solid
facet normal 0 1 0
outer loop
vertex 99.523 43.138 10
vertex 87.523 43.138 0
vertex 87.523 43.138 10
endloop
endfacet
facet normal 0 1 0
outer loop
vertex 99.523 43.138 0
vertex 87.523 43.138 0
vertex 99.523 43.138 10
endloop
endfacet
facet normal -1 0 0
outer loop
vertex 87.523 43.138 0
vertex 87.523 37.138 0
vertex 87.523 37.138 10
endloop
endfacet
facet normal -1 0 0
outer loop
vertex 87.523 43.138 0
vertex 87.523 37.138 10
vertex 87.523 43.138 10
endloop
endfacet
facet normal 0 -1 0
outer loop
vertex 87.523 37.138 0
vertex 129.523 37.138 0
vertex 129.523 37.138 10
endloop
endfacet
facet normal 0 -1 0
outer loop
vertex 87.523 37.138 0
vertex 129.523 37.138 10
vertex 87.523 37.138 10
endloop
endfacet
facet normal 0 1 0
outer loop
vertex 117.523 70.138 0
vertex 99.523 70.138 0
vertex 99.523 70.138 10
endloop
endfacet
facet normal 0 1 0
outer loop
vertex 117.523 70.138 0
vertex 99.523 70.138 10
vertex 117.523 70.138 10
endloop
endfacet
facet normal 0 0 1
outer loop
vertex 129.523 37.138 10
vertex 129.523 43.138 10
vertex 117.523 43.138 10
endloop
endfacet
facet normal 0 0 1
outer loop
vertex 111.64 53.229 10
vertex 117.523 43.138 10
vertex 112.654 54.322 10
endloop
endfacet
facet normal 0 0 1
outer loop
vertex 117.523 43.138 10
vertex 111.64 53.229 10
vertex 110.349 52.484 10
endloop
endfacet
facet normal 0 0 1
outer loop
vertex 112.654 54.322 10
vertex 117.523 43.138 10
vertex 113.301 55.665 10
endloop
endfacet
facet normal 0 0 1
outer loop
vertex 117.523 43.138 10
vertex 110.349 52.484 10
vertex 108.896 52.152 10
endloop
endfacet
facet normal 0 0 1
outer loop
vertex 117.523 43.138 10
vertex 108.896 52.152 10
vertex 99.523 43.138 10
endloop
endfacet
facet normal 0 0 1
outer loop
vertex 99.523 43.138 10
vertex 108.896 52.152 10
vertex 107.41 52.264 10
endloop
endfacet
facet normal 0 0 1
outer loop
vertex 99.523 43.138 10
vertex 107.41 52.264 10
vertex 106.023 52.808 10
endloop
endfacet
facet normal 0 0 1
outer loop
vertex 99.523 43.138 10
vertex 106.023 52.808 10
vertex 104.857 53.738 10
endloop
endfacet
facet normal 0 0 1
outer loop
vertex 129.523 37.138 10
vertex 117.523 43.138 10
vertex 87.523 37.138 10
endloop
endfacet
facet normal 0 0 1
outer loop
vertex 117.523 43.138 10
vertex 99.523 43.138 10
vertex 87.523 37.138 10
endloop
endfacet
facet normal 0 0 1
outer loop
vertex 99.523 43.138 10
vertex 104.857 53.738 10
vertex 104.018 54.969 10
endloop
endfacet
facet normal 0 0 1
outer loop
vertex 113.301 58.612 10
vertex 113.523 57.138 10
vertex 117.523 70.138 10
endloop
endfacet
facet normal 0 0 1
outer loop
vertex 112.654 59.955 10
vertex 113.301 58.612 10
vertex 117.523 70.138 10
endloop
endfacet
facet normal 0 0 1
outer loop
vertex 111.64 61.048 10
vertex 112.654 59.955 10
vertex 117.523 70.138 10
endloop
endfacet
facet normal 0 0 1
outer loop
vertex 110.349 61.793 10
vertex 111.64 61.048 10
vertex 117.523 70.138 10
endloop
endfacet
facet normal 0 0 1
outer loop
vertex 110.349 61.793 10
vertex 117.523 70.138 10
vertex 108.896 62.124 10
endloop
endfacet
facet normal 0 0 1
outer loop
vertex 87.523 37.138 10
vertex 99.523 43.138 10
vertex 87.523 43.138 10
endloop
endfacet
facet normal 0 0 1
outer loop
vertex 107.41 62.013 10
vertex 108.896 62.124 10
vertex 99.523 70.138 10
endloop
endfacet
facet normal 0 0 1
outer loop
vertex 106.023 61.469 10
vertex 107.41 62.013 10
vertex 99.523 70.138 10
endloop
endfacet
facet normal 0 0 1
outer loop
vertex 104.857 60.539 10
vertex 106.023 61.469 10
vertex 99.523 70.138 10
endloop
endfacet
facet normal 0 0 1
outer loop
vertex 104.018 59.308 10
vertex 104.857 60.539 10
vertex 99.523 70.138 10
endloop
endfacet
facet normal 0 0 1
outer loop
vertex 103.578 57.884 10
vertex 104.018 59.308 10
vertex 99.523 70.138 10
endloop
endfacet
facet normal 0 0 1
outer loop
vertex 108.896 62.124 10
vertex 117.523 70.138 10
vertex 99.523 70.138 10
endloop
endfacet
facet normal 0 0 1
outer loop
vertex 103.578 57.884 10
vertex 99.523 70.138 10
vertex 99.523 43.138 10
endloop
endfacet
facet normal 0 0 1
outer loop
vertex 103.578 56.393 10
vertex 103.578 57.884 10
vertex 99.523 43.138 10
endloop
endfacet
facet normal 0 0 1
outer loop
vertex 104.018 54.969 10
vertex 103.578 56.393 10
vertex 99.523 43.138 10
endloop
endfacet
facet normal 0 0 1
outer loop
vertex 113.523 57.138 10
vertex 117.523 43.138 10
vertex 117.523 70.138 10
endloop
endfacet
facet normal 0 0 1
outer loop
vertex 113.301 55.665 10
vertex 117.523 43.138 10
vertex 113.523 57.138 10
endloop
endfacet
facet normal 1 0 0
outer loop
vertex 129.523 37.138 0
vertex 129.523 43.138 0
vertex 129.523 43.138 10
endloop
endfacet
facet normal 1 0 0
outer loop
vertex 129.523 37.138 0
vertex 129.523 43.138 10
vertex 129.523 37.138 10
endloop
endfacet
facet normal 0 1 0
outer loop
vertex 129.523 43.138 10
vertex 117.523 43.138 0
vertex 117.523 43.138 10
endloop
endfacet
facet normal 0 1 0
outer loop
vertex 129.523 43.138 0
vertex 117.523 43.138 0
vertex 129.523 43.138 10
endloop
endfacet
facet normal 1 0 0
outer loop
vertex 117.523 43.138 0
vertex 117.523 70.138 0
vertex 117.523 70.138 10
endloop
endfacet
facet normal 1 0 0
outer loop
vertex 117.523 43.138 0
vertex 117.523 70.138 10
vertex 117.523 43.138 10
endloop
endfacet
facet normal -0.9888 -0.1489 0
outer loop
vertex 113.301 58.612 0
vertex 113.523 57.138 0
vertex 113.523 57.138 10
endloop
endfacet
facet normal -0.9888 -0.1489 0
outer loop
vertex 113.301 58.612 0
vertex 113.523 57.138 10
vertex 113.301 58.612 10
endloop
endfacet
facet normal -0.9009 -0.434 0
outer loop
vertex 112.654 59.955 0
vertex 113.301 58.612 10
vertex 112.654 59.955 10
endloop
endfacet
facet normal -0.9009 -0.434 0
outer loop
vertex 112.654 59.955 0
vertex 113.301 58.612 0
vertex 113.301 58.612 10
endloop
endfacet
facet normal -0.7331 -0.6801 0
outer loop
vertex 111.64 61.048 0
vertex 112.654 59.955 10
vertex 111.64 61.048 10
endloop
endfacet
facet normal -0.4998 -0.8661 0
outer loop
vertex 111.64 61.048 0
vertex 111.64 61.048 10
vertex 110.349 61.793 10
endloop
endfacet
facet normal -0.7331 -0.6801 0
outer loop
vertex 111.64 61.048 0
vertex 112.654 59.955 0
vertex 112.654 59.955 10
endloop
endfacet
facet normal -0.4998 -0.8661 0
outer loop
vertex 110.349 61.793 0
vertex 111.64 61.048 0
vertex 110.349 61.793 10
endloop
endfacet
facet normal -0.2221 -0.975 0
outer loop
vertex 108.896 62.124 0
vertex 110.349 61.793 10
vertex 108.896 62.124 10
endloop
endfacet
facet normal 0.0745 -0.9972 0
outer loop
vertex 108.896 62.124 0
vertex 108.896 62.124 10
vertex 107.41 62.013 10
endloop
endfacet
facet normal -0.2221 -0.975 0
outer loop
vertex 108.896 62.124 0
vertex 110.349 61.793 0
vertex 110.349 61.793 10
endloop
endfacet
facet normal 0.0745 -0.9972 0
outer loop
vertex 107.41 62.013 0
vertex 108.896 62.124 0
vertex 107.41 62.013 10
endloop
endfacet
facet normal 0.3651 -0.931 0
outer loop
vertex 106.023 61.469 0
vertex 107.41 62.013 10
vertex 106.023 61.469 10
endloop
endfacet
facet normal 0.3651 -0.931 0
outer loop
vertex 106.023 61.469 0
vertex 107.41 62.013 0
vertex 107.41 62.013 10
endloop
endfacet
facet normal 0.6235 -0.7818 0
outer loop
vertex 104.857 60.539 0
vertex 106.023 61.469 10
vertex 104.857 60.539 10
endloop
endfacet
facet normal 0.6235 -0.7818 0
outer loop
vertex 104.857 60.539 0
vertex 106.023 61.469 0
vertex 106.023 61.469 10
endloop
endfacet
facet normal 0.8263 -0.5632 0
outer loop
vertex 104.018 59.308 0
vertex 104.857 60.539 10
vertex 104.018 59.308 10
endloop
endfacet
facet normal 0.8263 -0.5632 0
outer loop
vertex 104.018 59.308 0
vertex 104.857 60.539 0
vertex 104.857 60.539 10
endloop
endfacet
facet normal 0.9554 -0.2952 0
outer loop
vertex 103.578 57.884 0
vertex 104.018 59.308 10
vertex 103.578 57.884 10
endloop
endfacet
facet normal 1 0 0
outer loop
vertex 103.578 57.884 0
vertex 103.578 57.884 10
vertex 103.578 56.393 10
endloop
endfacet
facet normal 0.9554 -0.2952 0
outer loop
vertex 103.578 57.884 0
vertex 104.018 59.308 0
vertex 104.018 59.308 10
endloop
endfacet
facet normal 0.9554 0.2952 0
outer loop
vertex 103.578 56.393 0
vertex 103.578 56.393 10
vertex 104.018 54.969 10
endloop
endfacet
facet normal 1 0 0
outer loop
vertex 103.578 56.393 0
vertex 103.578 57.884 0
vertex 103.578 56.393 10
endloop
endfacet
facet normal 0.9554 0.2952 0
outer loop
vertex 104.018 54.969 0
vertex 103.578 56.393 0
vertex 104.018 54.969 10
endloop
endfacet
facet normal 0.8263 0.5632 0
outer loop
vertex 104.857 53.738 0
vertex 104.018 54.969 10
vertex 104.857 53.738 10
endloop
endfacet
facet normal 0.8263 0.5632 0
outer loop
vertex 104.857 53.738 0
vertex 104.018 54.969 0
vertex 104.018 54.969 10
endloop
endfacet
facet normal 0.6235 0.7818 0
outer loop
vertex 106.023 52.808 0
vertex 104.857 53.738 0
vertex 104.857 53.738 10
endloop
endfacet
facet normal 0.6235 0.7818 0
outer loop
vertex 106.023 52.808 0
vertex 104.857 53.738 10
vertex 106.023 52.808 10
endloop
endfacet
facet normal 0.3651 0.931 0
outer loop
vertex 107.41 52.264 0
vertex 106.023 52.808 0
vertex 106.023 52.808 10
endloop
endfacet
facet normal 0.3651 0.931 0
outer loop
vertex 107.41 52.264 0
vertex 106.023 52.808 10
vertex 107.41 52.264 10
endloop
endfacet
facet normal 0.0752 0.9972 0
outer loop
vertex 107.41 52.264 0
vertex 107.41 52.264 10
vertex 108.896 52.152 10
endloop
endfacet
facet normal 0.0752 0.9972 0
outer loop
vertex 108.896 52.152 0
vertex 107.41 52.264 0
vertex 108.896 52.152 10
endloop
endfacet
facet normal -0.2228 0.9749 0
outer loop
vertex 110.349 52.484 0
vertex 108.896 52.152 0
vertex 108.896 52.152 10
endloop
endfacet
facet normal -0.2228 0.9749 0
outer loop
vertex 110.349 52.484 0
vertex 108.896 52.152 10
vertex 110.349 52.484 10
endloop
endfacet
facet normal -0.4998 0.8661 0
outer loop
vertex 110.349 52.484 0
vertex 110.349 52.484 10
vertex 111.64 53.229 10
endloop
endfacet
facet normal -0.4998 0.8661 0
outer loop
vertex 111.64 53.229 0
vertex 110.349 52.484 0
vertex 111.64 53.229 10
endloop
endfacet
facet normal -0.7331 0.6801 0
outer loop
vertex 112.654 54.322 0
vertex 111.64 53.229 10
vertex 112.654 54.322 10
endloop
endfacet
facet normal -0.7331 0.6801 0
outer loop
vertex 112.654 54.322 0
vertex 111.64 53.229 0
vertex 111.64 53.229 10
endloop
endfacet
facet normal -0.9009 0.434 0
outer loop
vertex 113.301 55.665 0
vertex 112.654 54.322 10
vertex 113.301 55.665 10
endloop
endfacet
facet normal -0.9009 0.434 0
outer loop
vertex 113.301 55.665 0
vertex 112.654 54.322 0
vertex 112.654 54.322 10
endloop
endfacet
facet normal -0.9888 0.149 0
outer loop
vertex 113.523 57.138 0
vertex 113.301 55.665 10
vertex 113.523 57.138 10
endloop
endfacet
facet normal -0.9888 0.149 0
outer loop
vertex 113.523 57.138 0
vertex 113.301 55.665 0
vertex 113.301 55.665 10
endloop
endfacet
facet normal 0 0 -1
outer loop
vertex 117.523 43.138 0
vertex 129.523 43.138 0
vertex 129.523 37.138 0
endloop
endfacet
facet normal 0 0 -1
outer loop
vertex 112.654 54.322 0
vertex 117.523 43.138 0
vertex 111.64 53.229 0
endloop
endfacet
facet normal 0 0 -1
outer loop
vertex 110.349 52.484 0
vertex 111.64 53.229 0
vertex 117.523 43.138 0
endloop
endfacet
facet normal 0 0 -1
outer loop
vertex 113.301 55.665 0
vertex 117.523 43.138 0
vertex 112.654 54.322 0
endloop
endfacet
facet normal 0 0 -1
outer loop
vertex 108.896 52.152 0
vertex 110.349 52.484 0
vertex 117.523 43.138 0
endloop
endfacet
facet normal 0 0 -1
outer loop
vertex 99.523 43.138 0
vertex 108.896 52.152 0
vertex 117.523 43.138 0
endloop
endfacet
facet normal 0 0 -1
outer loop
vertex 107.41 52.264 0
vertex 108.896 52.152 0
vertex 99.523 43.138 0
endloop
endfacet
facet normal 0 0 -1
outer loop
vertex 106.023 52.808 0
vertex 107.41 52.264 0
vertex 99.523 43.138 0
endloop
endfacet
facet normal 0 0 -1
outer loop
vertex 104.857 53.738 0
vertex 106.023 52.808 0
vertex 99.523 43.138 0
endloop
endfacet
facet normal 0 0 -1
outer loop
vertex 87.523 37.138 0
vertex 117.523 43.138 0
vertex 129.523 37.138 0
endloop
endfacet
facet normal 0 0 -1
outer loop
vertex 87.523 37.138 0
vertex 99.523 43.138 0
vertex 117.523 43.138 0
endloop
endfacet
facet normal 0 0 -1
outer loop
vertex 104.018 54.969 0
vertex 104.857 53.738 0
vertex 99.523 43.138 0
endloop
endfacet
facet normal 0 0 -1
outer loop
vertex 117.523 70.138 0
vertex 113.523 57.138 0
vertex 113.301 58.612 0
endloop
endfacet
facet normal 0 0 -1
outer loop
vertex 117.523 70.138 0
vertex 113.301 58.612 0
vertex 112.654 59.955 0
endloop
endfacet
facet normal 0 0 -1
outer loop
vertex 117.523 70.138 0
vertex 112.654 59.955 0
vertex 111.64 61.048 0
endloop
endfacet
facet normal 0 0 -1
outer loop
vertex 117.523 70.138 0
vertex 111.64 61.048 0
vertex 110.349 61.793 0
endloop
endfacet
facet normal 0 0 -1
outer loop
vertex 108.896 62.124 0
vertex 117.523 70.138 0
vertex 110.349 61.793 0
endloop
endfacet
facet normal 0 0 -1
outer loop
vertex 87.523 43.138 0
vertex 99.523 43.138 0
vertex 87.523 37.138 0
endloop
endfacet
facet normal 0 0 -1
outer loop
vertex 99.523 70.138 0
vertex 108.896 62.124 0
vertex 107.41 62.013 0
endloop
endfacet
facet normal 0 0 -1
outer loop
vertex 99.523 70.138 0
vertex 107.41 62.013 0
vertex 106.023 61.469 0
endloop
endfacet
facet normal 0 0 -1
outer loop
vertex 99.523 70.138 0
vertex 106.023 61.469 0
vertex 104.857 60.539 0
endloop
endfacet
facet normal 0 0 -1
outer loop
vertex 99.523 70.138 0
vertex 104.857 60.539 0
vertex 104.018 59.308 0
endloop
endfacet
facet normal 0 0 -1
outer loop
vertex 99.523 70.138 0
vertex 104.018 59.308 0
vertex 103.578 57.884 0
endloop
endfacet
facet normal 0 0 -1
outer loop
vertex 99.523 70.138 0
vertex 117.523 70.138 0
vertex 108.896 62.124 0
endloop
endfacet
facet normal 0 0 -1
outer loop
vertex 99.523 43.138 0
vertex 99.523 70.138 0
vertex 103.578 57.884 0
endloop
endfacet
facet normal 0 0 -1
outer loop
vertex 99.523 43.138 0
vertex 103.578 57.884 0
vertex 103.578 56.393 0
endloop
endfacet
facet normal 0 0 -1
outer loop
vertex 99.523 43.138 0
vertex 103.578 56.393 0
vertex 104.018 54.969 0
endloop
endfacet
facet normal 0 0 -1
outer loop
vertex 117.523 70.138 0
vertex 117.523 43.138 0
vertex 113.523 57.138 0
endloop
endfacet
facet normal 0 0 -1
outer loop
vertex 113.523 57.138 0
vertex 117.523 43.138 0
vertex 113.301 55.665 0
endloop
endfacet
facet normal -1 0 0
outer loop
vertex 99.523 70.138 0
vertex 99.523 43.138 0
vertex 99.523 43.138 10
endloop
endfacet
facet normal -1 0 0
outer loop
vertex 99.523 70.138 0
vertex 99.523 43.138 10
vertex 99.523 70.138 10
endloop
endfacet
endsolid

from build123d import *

# Parameters (mm, degrees)
SKETCH_R      = 5
EXTRUDE_DEPTH = 10


with BuildPart() as part:
    # Sketch → Extrude (new body)
    with BuildSketch(Plane.XY):
        Polygon((28.522638, 37.138413), (28.522638, 43.138413), (40.522638, 43.138413), (40.522638, 70.138413), (58.522638, 70.138413), (58.522638, 43.138413), (70.522638, 43.138413), (70.522638, 37.138413), align=None)
        with Locations((49.522638, 57.138413)):
            Circle(SKETCH_R, mode=Mode.SUBTRACT)
    extrude(amount=EXTRUDE_DEPTH)


with BuildPart() as part_1:
    # Extrude placement: moved
    add(part.part.moved(Location((59, 0, 0))))


solid = part_1.part
